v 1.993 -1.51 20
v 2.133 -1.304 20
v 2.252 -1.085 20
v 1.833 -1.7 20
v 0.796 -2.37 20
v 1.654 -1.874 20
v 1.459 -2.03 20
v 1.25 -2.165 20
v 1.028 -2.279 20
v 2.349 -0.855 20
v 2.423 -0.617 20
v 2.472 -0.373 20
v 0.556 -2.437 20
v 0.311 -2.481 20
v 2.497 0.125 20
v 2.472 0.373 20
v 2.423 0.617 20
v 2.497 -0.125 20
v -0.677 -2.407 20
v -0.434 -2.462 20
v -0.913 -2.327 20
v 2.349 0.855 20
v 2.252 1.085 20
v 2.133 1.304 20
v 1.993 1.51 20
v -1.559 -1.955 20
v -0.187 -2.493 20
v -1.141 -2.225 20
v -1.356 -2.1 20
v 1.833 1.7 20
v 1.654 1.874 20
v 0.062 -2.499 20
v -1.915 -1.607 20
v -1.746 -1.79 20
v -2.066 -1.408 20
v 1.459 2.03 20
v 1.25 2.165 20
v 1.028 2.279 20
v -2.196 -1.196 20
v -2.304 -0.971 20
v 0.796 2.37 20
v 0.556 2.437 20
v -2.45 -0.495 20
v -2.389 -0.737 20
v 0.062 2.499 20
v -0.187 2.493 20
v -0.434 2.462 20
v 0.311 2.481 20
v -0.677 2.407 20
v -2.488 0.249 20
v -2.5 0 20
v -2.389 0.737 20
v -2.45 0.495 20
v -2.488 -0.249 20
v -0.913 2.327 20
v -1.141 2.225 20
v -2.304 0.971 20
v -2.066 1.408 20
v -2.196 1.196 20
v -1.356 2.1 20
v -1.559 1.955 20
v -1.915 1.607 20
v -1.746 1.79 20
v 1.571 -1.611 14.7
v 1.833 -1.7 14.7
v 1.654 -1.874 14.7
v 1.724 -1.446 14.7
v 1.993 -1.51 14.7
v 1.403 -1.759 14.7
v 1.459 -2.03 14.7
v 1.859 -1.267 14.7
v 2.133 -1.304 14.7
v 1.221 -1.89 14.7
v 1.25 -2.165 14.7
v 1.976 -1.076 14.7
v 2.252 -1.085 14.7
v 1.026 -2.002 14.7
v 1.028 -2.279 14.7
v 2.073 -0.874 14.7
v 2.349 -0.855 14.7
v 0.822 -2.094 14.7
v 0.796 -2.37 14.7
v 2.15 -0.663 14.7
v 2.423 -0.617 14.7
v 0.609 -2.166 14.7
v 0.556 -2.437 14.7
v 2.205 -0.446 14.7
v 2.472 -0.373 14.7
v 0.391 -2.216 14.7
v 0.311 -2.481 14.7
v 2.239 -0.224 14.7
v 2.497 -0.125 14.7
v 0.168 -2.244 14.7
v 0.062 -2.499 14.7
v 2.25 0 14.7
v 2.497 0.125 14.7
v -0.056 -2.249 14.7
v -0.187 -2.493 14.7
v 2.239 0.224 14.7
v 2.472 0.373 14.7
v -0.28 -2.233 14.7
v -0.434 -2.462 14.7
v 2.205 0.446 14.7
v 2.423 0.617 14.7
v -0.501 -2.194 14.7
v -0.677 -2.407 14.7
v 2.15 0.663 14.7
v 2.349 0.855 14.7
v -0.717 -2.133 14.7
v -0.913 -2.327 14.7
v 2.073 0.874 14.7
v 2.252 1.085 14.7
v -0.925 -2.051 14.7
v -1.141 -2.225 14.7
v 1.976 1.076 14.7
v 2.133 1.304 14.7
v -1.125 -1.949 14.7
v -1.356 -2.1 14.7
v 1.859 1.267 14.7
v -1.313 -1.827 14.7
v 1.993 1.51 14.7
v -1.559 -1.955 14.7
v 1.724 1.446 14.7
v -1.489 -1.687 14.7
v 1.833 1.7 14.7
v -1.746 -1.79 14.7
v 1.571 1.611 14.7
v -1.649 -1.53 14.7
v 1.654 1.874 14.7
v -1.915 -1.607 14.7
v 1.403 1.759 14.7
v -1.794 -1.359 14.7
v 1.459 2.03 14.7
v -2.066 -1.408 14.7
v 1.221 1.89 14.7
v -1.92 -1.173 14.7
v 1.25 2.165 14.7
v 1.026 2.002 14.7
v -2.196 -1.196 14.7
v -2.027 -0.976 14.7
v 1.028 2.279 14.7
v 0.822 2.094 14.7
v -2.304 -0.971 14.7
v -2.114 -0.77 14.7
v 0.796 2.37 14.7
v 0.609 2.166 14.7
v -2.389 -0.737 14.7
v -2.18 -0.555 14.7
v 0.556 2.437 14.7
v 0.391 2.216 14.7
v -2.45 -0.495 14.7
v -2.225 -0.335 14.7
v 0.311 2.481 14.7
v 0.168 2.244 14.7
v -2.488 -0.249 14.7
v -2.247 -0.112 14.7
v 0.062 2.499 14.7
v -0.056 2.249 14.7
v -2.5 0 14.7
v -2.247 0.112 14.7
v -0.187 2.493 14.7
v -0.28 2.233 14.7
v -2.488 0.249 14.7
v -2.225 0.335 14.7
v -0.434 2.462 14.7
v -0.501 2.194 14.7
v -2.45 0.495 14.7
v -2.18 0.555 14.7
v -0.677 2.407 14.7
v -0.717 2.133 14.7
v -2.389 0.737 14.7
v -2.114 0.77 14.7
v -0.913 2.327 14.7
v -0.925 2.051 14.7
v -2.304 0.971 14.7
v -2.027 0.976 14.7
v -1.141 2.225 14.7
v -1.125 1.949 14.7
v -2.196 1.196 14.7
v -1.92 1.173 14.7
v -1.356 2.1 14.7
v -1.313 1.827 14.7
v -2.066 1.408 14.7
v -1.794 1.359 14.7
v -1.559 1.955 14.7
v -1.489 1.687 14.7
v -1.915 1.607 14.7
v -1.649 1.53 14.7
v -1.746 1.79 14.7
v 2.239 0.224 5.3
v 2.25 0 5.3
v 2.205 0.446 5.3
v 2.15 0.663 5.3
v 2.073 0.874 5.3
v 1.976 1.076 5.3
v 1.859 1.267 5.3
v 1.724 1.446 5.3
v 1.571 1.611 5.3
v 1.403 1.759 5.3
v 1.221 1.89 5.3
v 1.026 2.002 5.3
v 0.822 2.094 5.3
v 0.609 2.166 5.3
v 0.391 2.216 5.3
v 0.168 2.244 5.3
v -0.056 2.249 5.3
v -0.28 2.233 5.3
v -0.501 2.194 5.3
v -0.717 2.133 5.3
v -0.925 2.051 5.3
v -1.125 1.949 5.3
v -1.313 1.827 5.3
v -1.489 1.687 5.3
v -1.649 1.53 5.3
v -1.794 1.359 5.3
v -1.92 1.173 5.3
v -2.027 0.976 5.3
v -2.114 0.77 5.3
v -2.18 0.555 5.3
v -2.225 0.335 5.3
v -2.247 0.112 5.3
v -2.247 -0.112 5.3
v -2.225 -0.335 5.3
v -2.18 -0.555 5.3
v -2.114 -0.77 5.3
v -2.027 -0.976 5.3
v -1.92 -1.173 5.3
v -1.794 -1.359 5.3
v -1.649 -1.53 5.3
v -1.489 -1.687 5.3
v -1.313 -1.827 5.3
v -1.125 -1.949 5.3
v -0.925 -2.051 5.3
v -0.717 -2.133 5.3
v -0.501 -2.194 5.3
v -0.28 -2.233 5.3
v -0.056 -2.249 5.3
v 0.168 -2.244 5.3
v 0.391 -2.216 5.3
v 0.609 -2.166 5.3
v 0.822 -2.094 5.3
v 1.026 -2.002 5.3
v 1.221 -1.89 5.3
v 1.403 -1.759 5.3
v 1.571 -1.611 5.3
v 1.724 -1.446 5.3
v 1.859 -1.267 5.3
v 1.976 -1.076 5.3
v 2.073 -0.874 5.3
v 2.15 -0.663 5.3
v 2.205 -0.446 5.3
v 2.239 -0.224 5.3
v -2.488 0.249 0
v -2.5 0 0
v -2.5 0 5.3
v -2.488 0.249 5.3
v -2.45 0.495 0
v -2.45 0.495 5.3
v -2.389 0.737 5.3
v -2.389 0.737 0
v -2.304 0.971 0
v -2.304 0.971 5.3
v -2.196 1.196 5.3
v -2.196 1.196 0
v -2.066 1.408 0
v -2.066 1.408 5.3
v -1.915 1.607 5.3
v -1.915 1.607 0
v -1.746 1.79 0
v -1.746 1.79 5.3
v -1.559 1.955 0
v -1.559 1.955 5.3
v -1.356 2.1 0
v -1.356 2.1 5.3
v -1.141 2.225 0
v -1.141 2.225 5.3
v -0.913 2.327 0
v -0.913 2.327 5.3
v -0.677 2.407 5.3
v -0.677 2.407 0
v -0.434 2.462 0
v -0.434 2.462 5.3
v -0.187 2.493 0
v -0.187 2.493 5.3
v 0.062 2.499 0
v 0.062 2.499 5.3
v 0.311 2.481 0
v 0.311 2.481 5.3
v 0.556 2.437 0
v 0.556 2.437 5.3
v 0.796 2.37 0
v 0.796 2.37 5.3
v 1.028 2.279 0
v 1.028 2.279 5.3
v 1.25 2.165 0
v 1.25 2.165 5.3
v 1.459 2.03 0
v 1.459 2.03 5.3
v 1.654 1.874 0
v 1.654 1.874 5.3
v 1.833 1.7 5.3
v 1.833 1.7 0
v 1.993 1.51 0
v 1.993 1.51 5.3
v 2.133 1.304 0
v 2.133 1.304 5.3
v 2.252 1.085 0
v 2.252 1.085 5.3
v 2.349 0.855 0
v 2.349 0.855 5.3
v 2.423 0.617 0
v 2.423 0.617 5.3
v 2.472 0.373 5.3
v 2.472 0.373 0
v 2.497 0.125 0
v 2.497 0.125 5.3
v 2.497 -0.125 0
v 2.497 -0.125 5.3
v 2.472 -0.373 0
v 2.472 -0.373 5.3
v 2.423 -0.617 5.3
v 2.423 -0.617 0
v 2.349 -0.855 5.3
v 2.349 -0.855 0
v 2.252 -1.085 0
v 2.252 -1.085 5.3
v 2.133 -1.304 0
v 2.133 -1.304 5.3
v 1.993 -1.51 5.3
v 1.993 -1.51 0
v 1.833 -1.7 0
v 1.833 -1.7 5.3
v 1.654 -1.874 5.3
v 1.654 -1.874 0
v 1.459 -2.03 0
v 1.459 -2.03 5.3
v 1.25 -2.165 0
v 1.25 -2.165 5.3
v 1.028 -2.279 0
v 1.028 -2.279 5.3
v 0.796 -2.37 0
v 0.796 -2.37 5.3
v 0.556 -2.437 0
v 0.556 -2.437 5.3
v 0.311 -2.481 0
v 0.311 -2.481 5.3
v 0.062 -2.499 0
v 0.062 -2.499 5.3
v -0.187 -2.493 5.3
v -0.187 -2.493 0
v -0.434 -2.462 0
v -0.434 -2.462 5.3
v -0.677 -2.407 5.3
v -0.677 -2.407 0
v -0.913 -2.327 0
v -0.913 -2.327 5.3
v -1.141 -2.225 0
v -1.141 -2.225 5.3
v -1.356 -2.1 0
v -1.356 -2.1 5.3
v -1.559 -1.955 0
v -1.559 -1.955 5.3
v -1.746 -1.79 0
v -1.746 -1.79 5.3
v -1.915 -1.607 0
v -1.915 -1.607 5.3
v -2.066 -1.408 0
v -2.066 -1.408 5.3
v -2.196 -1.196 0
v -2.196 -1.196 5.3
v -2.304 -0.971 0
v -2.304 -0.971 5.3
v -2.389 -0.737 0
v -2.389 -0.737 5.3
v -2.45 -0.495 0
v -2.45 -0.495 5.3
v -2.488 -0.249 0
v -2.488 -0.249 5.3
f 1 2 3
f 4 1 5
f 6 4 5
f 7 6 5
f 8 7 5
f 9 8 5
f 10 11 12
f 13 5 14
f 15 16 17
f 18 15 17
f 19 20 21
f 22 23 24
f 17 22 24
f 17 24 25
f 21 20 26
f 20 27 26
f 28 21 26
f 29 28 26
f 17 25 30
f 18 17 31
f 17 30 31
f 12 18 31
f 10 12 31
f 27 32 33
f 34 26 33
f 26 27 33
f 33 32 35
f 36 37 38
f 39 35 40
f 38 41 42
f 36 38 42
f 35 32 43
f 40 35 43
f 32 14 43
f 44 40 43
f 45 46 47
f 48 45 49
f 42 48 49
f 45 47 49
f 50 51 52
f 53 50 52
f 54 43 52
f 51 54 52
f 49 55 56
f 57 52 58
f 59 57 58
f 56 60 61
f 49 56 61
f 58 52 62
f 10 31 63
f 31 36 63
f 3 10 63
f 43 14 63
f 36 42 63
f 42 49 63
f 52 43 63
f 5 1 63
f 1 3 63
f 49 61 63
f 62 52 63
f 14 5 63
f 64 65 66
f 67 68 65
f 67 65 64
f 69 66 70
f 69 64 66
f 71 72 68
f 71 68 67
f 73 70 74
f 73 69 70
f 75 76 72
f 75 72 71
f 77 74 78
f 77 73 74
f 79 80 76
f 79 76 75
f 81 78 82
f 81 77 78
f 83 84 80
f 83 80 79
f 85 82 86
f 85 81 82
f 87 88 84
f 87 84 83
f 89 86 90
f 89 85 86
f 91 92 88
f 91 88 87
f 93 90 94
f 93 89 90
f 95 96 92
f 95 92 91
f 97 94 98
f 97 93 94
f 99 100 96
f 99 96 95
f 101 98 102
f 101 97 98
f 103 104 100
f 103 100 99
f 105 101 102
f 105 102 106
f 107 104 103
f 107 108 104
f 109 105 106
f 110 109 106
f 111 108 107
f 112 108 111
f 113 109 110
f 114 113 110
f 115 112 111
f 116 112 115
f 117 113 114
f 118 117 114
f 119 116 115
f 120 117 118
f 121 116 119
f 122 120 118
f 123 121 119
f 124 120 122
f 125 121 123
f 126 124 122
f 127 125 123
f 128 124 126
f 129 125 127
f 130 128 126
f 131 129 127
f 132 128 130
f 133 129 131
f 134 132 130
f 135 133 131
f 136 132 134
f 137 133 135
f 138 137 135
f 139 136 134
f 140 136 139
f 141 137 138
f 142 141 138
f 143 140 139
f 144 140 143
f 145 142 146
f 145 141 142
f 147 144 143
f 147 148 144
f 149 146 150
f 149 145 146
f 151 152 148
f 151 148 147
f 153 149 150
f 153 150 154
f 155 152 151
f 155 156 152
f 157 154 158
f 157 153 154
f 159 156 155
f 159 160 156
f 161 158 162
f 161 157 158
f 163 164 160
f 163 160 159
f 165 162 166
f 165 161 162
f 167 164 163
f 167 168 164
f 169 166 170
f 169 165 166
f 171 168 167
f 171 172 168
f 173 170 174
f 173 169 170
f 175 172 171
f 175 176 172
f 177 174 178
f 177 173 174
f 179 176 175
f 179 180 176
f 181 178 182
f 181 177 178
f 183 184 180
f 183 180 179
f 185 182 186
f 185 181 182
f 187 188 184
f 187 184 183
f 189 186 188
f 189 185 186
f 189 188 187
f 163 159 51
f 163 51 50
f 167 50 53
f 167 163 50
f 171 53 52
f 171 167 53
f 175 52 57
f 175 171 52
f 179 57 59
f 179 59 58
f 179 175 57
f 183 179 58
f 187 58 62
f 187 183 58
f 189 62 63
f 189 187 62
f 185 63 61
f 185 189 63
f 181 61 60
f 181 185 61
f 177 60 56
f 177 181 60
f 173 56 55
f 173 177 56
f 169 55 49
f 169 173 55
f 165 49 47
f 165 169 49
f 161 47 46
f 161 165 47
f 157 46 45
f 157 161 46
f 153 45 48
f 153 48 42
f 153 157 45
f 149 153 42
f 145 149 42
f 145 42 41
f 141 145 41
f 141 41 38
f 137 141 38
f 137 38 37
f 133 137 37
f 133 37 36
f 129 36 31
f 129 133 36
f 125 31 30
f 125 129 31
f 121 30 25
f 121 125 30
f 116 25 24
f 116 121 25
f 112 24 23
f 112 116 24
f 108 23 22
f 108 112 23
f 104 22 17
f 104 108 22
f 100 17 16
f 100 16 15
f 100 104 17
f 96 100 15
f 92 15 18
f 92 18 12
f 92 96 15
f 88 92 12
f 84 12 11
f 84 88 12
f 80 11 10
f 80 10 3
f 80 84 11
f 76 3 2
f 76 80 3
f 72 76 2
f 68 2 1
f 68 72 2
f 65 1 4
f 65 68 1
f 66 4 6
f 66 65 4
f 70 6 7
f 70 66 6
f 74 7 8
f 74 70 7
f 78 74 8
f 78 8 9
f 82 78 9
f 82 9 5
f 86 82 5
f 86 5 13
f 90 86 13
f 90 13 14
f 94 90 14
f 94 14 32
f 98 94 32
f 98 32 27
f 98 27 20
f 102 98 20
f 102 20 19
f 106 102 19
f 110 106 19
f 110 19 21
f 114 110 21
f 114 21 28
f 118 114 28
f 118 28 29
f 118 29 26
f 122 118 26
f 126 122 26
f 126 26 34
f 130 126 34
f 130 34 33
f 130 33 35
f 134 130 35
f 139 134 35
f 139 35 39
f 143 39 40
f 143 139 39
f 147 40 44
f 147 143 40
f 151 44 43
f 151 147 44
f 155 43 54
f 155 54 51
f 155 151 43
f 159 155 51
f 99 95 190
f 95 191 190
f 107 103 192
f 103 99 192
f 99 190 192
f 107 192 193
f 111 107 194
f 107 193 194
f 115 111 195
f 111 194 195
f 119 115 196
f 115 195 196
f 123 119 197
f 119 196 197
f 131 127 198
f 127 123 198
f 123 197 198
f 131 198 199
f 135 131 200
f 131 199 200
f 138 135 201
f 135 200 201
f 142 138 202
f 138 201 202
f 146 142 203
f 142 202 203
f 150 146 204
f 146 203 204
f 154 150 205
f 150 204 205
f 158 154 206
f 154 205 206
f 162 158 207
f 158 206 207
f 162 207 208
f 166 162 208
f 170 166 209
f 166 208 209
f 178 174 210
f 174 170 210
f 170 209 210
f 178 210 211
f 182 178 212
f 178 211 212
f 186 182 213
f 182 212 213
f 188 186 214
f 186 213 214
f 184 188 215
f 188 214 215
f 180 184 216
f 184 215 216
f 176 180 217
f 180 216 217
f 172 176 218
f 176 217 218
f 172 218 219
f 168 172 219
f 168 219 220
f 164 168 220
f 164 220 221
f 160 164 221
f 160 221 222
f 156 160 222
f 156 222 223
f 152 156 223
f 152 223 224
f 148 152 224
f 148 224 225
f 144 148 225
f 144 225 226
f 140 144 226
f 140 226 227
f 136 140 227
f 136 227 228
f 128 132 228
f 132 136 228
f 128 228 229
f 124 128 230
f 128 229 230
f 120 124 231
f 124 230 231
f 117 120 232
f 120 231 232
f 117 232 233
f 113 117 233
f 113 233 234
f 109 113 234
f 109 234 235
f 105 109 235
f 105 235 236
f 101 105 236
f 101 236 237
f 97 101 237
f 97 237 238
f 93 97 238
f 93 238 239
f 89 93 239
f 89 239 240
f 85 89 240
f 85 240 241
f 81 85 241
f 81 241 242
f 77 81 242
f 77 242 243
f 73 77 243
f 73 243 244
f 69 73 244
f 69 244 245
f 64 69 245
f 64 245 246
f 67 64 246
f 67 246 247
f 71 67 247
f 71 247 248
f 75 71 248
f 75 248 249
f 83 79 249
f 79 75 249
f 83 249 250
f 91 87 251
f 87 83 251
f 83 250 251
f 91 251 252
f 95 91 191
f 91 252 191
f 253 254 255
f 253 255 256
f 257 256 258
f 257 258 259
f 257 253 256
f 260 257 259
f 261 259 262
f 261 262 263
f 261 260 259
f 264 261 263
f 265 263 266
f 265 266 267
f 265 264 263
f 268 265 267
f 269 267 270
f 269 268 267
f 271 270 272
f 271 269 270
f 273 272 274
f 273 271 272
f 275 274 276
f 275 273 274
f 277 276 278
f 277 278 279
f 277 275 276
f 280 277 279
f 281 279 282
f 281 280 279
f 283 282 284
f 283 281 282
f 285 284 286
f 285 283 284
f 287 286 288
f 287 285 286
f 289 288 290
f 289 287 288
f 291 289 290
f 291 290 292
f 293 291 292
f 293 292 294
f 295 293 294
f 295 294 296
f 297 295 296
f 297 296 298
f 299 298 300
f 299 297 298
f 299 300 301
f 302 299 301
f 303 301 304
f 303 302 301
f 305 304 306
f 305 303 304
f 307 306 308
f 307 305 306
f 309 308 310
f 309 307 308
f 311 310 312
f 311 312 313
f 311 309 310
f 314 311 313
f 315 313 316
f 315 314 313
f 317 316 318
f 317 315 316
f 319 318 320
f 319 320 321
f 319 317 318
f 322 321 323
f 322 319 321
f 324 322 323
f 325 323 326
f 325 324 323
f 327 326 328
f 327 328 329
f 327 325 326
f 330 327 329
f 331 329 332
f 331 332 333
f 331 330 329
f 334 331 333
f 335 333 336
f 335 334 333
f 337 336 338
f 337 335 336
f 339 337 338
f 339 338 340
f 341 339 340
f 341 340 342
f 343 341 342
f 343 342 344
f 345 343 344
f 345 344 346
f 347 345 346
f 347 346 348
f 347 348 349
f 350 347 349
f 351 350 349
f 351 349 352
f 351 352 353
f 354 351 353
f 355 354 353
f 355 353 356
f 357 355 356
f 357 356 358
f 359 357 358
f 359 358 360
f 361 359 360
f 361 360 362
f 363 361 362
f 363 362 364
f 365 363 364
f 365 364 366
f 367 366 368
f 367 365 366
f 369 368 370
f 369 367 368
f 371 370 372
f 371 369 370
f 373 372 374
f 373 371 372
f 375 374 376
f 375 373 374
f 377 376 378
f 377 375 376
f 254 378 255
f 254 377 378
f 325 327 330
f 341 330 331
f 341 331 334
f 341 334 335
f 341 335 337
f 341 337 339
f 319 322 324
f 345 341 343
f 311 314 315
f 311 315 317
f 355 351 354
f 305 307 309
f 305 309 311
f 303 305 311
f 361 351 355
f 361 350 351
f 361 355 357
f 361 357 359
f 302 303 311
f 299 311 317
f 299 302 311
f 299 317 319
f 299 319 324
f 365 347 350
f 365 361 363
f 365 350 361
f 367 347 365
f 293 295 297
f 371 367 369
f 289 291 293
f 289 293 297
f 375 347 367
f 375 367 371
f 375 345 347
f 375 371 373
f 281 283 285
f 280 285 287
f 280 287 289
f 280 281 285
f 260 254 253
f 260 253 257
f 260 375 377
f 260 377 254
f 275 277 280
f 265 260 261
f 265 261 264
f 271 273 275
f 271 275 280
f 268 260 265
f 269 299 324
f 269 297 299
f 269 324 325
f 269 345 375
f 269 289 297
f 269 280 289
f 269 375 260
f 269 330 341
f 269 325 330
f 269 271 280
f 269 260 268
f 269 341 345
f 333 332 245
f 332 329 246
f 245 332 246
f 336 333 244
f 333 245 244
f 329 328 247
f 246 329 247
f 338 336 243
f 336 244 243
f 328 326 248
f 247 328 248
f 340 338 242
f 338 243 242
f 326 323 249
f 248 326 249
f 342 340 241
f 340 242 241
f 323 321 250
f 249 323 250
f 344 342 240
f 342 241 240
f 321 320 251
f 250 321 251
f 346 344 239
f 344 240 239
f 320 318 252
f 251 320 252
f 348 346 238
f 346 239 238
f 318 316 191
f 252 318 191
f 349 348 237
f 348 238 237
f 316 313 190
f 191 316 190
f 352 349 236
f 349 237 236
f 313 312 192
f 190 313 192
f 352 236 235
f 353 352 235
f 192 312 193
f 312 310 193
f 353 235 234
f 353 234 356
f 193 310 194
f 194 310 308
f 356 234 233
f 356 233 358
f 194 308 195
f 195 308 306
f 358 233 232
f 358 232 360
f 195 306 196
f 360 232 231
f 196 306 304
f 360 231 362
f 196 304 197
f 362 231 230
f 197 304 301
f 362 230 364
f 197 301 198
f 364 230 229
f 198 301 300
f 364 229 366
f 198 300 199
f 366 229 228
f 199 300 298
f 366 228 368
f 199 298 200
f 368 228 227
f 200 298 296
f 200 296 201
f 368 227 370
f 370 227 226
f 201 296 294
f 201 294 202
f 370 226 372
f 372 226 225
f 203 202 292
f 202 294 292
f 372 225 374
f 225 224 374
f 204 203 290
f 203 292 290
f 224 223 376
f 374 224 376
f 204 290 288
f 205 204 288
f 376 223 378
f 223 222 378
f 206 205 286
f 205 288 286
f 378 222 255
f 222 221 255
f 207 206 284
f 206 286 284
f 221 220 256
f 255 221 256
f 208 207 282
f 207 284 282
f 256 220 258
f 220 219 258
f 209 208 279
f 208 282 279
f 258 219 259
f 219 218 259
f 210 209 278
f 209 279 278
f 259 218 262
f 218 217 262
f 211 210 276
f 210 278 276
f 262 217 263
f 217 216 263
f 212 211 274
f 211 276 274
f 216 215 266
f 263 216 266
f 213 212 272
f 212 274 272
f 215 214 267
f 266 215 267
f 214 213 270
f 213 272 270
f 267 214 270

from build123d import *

# Parameters (mm, degrees)
SKETCH1_R           = 2.25
BOSS_EXTRUDE1_DEPTH = 20
SKETCH2_R           = 2.5
BOSS_EXTRUDE2_DEPTH = 5.3
BOSS_EXTRUDE3_START = -14.7
SKETCH2_2_R         = 2.5
BOSS_EXTRUDE3_DEPTH = 5.3


with BuildPart() as part:
    # Sketch1 → Boss-Extrude1 (new body)
    with BuildSketch(Plane.XY):
        Circle(SKETCH1_R)
    extrude(amount=BOSS_EXTRUDE1_DEPTH)

    # Sketch2 → Boss-Extrude2 (add)
    with BuildSketch(Plane(origin=(0, 0, 0), x_dir=(-1, 0, 0), z_dir=(0, 0, -1))):
        Circle(SKETCH2_R)
    extrude(amount=-BOSS_EXTRUDE2_DEPTH)

    # Sketch2<2> → Boss-Extrude3 (add)
    with BuildSketch(Plane(origin=(0, 0, 0), x_dir=(-1, 0, 0), z_dir=(0, 0, -1)).offset(BOSS_EXTRUDE3_START)):
        Circle(SKETCH2_2_R)
    extrude(amount=-BOSS_EXTRUDE3_DEPTH)


solid = part.part
